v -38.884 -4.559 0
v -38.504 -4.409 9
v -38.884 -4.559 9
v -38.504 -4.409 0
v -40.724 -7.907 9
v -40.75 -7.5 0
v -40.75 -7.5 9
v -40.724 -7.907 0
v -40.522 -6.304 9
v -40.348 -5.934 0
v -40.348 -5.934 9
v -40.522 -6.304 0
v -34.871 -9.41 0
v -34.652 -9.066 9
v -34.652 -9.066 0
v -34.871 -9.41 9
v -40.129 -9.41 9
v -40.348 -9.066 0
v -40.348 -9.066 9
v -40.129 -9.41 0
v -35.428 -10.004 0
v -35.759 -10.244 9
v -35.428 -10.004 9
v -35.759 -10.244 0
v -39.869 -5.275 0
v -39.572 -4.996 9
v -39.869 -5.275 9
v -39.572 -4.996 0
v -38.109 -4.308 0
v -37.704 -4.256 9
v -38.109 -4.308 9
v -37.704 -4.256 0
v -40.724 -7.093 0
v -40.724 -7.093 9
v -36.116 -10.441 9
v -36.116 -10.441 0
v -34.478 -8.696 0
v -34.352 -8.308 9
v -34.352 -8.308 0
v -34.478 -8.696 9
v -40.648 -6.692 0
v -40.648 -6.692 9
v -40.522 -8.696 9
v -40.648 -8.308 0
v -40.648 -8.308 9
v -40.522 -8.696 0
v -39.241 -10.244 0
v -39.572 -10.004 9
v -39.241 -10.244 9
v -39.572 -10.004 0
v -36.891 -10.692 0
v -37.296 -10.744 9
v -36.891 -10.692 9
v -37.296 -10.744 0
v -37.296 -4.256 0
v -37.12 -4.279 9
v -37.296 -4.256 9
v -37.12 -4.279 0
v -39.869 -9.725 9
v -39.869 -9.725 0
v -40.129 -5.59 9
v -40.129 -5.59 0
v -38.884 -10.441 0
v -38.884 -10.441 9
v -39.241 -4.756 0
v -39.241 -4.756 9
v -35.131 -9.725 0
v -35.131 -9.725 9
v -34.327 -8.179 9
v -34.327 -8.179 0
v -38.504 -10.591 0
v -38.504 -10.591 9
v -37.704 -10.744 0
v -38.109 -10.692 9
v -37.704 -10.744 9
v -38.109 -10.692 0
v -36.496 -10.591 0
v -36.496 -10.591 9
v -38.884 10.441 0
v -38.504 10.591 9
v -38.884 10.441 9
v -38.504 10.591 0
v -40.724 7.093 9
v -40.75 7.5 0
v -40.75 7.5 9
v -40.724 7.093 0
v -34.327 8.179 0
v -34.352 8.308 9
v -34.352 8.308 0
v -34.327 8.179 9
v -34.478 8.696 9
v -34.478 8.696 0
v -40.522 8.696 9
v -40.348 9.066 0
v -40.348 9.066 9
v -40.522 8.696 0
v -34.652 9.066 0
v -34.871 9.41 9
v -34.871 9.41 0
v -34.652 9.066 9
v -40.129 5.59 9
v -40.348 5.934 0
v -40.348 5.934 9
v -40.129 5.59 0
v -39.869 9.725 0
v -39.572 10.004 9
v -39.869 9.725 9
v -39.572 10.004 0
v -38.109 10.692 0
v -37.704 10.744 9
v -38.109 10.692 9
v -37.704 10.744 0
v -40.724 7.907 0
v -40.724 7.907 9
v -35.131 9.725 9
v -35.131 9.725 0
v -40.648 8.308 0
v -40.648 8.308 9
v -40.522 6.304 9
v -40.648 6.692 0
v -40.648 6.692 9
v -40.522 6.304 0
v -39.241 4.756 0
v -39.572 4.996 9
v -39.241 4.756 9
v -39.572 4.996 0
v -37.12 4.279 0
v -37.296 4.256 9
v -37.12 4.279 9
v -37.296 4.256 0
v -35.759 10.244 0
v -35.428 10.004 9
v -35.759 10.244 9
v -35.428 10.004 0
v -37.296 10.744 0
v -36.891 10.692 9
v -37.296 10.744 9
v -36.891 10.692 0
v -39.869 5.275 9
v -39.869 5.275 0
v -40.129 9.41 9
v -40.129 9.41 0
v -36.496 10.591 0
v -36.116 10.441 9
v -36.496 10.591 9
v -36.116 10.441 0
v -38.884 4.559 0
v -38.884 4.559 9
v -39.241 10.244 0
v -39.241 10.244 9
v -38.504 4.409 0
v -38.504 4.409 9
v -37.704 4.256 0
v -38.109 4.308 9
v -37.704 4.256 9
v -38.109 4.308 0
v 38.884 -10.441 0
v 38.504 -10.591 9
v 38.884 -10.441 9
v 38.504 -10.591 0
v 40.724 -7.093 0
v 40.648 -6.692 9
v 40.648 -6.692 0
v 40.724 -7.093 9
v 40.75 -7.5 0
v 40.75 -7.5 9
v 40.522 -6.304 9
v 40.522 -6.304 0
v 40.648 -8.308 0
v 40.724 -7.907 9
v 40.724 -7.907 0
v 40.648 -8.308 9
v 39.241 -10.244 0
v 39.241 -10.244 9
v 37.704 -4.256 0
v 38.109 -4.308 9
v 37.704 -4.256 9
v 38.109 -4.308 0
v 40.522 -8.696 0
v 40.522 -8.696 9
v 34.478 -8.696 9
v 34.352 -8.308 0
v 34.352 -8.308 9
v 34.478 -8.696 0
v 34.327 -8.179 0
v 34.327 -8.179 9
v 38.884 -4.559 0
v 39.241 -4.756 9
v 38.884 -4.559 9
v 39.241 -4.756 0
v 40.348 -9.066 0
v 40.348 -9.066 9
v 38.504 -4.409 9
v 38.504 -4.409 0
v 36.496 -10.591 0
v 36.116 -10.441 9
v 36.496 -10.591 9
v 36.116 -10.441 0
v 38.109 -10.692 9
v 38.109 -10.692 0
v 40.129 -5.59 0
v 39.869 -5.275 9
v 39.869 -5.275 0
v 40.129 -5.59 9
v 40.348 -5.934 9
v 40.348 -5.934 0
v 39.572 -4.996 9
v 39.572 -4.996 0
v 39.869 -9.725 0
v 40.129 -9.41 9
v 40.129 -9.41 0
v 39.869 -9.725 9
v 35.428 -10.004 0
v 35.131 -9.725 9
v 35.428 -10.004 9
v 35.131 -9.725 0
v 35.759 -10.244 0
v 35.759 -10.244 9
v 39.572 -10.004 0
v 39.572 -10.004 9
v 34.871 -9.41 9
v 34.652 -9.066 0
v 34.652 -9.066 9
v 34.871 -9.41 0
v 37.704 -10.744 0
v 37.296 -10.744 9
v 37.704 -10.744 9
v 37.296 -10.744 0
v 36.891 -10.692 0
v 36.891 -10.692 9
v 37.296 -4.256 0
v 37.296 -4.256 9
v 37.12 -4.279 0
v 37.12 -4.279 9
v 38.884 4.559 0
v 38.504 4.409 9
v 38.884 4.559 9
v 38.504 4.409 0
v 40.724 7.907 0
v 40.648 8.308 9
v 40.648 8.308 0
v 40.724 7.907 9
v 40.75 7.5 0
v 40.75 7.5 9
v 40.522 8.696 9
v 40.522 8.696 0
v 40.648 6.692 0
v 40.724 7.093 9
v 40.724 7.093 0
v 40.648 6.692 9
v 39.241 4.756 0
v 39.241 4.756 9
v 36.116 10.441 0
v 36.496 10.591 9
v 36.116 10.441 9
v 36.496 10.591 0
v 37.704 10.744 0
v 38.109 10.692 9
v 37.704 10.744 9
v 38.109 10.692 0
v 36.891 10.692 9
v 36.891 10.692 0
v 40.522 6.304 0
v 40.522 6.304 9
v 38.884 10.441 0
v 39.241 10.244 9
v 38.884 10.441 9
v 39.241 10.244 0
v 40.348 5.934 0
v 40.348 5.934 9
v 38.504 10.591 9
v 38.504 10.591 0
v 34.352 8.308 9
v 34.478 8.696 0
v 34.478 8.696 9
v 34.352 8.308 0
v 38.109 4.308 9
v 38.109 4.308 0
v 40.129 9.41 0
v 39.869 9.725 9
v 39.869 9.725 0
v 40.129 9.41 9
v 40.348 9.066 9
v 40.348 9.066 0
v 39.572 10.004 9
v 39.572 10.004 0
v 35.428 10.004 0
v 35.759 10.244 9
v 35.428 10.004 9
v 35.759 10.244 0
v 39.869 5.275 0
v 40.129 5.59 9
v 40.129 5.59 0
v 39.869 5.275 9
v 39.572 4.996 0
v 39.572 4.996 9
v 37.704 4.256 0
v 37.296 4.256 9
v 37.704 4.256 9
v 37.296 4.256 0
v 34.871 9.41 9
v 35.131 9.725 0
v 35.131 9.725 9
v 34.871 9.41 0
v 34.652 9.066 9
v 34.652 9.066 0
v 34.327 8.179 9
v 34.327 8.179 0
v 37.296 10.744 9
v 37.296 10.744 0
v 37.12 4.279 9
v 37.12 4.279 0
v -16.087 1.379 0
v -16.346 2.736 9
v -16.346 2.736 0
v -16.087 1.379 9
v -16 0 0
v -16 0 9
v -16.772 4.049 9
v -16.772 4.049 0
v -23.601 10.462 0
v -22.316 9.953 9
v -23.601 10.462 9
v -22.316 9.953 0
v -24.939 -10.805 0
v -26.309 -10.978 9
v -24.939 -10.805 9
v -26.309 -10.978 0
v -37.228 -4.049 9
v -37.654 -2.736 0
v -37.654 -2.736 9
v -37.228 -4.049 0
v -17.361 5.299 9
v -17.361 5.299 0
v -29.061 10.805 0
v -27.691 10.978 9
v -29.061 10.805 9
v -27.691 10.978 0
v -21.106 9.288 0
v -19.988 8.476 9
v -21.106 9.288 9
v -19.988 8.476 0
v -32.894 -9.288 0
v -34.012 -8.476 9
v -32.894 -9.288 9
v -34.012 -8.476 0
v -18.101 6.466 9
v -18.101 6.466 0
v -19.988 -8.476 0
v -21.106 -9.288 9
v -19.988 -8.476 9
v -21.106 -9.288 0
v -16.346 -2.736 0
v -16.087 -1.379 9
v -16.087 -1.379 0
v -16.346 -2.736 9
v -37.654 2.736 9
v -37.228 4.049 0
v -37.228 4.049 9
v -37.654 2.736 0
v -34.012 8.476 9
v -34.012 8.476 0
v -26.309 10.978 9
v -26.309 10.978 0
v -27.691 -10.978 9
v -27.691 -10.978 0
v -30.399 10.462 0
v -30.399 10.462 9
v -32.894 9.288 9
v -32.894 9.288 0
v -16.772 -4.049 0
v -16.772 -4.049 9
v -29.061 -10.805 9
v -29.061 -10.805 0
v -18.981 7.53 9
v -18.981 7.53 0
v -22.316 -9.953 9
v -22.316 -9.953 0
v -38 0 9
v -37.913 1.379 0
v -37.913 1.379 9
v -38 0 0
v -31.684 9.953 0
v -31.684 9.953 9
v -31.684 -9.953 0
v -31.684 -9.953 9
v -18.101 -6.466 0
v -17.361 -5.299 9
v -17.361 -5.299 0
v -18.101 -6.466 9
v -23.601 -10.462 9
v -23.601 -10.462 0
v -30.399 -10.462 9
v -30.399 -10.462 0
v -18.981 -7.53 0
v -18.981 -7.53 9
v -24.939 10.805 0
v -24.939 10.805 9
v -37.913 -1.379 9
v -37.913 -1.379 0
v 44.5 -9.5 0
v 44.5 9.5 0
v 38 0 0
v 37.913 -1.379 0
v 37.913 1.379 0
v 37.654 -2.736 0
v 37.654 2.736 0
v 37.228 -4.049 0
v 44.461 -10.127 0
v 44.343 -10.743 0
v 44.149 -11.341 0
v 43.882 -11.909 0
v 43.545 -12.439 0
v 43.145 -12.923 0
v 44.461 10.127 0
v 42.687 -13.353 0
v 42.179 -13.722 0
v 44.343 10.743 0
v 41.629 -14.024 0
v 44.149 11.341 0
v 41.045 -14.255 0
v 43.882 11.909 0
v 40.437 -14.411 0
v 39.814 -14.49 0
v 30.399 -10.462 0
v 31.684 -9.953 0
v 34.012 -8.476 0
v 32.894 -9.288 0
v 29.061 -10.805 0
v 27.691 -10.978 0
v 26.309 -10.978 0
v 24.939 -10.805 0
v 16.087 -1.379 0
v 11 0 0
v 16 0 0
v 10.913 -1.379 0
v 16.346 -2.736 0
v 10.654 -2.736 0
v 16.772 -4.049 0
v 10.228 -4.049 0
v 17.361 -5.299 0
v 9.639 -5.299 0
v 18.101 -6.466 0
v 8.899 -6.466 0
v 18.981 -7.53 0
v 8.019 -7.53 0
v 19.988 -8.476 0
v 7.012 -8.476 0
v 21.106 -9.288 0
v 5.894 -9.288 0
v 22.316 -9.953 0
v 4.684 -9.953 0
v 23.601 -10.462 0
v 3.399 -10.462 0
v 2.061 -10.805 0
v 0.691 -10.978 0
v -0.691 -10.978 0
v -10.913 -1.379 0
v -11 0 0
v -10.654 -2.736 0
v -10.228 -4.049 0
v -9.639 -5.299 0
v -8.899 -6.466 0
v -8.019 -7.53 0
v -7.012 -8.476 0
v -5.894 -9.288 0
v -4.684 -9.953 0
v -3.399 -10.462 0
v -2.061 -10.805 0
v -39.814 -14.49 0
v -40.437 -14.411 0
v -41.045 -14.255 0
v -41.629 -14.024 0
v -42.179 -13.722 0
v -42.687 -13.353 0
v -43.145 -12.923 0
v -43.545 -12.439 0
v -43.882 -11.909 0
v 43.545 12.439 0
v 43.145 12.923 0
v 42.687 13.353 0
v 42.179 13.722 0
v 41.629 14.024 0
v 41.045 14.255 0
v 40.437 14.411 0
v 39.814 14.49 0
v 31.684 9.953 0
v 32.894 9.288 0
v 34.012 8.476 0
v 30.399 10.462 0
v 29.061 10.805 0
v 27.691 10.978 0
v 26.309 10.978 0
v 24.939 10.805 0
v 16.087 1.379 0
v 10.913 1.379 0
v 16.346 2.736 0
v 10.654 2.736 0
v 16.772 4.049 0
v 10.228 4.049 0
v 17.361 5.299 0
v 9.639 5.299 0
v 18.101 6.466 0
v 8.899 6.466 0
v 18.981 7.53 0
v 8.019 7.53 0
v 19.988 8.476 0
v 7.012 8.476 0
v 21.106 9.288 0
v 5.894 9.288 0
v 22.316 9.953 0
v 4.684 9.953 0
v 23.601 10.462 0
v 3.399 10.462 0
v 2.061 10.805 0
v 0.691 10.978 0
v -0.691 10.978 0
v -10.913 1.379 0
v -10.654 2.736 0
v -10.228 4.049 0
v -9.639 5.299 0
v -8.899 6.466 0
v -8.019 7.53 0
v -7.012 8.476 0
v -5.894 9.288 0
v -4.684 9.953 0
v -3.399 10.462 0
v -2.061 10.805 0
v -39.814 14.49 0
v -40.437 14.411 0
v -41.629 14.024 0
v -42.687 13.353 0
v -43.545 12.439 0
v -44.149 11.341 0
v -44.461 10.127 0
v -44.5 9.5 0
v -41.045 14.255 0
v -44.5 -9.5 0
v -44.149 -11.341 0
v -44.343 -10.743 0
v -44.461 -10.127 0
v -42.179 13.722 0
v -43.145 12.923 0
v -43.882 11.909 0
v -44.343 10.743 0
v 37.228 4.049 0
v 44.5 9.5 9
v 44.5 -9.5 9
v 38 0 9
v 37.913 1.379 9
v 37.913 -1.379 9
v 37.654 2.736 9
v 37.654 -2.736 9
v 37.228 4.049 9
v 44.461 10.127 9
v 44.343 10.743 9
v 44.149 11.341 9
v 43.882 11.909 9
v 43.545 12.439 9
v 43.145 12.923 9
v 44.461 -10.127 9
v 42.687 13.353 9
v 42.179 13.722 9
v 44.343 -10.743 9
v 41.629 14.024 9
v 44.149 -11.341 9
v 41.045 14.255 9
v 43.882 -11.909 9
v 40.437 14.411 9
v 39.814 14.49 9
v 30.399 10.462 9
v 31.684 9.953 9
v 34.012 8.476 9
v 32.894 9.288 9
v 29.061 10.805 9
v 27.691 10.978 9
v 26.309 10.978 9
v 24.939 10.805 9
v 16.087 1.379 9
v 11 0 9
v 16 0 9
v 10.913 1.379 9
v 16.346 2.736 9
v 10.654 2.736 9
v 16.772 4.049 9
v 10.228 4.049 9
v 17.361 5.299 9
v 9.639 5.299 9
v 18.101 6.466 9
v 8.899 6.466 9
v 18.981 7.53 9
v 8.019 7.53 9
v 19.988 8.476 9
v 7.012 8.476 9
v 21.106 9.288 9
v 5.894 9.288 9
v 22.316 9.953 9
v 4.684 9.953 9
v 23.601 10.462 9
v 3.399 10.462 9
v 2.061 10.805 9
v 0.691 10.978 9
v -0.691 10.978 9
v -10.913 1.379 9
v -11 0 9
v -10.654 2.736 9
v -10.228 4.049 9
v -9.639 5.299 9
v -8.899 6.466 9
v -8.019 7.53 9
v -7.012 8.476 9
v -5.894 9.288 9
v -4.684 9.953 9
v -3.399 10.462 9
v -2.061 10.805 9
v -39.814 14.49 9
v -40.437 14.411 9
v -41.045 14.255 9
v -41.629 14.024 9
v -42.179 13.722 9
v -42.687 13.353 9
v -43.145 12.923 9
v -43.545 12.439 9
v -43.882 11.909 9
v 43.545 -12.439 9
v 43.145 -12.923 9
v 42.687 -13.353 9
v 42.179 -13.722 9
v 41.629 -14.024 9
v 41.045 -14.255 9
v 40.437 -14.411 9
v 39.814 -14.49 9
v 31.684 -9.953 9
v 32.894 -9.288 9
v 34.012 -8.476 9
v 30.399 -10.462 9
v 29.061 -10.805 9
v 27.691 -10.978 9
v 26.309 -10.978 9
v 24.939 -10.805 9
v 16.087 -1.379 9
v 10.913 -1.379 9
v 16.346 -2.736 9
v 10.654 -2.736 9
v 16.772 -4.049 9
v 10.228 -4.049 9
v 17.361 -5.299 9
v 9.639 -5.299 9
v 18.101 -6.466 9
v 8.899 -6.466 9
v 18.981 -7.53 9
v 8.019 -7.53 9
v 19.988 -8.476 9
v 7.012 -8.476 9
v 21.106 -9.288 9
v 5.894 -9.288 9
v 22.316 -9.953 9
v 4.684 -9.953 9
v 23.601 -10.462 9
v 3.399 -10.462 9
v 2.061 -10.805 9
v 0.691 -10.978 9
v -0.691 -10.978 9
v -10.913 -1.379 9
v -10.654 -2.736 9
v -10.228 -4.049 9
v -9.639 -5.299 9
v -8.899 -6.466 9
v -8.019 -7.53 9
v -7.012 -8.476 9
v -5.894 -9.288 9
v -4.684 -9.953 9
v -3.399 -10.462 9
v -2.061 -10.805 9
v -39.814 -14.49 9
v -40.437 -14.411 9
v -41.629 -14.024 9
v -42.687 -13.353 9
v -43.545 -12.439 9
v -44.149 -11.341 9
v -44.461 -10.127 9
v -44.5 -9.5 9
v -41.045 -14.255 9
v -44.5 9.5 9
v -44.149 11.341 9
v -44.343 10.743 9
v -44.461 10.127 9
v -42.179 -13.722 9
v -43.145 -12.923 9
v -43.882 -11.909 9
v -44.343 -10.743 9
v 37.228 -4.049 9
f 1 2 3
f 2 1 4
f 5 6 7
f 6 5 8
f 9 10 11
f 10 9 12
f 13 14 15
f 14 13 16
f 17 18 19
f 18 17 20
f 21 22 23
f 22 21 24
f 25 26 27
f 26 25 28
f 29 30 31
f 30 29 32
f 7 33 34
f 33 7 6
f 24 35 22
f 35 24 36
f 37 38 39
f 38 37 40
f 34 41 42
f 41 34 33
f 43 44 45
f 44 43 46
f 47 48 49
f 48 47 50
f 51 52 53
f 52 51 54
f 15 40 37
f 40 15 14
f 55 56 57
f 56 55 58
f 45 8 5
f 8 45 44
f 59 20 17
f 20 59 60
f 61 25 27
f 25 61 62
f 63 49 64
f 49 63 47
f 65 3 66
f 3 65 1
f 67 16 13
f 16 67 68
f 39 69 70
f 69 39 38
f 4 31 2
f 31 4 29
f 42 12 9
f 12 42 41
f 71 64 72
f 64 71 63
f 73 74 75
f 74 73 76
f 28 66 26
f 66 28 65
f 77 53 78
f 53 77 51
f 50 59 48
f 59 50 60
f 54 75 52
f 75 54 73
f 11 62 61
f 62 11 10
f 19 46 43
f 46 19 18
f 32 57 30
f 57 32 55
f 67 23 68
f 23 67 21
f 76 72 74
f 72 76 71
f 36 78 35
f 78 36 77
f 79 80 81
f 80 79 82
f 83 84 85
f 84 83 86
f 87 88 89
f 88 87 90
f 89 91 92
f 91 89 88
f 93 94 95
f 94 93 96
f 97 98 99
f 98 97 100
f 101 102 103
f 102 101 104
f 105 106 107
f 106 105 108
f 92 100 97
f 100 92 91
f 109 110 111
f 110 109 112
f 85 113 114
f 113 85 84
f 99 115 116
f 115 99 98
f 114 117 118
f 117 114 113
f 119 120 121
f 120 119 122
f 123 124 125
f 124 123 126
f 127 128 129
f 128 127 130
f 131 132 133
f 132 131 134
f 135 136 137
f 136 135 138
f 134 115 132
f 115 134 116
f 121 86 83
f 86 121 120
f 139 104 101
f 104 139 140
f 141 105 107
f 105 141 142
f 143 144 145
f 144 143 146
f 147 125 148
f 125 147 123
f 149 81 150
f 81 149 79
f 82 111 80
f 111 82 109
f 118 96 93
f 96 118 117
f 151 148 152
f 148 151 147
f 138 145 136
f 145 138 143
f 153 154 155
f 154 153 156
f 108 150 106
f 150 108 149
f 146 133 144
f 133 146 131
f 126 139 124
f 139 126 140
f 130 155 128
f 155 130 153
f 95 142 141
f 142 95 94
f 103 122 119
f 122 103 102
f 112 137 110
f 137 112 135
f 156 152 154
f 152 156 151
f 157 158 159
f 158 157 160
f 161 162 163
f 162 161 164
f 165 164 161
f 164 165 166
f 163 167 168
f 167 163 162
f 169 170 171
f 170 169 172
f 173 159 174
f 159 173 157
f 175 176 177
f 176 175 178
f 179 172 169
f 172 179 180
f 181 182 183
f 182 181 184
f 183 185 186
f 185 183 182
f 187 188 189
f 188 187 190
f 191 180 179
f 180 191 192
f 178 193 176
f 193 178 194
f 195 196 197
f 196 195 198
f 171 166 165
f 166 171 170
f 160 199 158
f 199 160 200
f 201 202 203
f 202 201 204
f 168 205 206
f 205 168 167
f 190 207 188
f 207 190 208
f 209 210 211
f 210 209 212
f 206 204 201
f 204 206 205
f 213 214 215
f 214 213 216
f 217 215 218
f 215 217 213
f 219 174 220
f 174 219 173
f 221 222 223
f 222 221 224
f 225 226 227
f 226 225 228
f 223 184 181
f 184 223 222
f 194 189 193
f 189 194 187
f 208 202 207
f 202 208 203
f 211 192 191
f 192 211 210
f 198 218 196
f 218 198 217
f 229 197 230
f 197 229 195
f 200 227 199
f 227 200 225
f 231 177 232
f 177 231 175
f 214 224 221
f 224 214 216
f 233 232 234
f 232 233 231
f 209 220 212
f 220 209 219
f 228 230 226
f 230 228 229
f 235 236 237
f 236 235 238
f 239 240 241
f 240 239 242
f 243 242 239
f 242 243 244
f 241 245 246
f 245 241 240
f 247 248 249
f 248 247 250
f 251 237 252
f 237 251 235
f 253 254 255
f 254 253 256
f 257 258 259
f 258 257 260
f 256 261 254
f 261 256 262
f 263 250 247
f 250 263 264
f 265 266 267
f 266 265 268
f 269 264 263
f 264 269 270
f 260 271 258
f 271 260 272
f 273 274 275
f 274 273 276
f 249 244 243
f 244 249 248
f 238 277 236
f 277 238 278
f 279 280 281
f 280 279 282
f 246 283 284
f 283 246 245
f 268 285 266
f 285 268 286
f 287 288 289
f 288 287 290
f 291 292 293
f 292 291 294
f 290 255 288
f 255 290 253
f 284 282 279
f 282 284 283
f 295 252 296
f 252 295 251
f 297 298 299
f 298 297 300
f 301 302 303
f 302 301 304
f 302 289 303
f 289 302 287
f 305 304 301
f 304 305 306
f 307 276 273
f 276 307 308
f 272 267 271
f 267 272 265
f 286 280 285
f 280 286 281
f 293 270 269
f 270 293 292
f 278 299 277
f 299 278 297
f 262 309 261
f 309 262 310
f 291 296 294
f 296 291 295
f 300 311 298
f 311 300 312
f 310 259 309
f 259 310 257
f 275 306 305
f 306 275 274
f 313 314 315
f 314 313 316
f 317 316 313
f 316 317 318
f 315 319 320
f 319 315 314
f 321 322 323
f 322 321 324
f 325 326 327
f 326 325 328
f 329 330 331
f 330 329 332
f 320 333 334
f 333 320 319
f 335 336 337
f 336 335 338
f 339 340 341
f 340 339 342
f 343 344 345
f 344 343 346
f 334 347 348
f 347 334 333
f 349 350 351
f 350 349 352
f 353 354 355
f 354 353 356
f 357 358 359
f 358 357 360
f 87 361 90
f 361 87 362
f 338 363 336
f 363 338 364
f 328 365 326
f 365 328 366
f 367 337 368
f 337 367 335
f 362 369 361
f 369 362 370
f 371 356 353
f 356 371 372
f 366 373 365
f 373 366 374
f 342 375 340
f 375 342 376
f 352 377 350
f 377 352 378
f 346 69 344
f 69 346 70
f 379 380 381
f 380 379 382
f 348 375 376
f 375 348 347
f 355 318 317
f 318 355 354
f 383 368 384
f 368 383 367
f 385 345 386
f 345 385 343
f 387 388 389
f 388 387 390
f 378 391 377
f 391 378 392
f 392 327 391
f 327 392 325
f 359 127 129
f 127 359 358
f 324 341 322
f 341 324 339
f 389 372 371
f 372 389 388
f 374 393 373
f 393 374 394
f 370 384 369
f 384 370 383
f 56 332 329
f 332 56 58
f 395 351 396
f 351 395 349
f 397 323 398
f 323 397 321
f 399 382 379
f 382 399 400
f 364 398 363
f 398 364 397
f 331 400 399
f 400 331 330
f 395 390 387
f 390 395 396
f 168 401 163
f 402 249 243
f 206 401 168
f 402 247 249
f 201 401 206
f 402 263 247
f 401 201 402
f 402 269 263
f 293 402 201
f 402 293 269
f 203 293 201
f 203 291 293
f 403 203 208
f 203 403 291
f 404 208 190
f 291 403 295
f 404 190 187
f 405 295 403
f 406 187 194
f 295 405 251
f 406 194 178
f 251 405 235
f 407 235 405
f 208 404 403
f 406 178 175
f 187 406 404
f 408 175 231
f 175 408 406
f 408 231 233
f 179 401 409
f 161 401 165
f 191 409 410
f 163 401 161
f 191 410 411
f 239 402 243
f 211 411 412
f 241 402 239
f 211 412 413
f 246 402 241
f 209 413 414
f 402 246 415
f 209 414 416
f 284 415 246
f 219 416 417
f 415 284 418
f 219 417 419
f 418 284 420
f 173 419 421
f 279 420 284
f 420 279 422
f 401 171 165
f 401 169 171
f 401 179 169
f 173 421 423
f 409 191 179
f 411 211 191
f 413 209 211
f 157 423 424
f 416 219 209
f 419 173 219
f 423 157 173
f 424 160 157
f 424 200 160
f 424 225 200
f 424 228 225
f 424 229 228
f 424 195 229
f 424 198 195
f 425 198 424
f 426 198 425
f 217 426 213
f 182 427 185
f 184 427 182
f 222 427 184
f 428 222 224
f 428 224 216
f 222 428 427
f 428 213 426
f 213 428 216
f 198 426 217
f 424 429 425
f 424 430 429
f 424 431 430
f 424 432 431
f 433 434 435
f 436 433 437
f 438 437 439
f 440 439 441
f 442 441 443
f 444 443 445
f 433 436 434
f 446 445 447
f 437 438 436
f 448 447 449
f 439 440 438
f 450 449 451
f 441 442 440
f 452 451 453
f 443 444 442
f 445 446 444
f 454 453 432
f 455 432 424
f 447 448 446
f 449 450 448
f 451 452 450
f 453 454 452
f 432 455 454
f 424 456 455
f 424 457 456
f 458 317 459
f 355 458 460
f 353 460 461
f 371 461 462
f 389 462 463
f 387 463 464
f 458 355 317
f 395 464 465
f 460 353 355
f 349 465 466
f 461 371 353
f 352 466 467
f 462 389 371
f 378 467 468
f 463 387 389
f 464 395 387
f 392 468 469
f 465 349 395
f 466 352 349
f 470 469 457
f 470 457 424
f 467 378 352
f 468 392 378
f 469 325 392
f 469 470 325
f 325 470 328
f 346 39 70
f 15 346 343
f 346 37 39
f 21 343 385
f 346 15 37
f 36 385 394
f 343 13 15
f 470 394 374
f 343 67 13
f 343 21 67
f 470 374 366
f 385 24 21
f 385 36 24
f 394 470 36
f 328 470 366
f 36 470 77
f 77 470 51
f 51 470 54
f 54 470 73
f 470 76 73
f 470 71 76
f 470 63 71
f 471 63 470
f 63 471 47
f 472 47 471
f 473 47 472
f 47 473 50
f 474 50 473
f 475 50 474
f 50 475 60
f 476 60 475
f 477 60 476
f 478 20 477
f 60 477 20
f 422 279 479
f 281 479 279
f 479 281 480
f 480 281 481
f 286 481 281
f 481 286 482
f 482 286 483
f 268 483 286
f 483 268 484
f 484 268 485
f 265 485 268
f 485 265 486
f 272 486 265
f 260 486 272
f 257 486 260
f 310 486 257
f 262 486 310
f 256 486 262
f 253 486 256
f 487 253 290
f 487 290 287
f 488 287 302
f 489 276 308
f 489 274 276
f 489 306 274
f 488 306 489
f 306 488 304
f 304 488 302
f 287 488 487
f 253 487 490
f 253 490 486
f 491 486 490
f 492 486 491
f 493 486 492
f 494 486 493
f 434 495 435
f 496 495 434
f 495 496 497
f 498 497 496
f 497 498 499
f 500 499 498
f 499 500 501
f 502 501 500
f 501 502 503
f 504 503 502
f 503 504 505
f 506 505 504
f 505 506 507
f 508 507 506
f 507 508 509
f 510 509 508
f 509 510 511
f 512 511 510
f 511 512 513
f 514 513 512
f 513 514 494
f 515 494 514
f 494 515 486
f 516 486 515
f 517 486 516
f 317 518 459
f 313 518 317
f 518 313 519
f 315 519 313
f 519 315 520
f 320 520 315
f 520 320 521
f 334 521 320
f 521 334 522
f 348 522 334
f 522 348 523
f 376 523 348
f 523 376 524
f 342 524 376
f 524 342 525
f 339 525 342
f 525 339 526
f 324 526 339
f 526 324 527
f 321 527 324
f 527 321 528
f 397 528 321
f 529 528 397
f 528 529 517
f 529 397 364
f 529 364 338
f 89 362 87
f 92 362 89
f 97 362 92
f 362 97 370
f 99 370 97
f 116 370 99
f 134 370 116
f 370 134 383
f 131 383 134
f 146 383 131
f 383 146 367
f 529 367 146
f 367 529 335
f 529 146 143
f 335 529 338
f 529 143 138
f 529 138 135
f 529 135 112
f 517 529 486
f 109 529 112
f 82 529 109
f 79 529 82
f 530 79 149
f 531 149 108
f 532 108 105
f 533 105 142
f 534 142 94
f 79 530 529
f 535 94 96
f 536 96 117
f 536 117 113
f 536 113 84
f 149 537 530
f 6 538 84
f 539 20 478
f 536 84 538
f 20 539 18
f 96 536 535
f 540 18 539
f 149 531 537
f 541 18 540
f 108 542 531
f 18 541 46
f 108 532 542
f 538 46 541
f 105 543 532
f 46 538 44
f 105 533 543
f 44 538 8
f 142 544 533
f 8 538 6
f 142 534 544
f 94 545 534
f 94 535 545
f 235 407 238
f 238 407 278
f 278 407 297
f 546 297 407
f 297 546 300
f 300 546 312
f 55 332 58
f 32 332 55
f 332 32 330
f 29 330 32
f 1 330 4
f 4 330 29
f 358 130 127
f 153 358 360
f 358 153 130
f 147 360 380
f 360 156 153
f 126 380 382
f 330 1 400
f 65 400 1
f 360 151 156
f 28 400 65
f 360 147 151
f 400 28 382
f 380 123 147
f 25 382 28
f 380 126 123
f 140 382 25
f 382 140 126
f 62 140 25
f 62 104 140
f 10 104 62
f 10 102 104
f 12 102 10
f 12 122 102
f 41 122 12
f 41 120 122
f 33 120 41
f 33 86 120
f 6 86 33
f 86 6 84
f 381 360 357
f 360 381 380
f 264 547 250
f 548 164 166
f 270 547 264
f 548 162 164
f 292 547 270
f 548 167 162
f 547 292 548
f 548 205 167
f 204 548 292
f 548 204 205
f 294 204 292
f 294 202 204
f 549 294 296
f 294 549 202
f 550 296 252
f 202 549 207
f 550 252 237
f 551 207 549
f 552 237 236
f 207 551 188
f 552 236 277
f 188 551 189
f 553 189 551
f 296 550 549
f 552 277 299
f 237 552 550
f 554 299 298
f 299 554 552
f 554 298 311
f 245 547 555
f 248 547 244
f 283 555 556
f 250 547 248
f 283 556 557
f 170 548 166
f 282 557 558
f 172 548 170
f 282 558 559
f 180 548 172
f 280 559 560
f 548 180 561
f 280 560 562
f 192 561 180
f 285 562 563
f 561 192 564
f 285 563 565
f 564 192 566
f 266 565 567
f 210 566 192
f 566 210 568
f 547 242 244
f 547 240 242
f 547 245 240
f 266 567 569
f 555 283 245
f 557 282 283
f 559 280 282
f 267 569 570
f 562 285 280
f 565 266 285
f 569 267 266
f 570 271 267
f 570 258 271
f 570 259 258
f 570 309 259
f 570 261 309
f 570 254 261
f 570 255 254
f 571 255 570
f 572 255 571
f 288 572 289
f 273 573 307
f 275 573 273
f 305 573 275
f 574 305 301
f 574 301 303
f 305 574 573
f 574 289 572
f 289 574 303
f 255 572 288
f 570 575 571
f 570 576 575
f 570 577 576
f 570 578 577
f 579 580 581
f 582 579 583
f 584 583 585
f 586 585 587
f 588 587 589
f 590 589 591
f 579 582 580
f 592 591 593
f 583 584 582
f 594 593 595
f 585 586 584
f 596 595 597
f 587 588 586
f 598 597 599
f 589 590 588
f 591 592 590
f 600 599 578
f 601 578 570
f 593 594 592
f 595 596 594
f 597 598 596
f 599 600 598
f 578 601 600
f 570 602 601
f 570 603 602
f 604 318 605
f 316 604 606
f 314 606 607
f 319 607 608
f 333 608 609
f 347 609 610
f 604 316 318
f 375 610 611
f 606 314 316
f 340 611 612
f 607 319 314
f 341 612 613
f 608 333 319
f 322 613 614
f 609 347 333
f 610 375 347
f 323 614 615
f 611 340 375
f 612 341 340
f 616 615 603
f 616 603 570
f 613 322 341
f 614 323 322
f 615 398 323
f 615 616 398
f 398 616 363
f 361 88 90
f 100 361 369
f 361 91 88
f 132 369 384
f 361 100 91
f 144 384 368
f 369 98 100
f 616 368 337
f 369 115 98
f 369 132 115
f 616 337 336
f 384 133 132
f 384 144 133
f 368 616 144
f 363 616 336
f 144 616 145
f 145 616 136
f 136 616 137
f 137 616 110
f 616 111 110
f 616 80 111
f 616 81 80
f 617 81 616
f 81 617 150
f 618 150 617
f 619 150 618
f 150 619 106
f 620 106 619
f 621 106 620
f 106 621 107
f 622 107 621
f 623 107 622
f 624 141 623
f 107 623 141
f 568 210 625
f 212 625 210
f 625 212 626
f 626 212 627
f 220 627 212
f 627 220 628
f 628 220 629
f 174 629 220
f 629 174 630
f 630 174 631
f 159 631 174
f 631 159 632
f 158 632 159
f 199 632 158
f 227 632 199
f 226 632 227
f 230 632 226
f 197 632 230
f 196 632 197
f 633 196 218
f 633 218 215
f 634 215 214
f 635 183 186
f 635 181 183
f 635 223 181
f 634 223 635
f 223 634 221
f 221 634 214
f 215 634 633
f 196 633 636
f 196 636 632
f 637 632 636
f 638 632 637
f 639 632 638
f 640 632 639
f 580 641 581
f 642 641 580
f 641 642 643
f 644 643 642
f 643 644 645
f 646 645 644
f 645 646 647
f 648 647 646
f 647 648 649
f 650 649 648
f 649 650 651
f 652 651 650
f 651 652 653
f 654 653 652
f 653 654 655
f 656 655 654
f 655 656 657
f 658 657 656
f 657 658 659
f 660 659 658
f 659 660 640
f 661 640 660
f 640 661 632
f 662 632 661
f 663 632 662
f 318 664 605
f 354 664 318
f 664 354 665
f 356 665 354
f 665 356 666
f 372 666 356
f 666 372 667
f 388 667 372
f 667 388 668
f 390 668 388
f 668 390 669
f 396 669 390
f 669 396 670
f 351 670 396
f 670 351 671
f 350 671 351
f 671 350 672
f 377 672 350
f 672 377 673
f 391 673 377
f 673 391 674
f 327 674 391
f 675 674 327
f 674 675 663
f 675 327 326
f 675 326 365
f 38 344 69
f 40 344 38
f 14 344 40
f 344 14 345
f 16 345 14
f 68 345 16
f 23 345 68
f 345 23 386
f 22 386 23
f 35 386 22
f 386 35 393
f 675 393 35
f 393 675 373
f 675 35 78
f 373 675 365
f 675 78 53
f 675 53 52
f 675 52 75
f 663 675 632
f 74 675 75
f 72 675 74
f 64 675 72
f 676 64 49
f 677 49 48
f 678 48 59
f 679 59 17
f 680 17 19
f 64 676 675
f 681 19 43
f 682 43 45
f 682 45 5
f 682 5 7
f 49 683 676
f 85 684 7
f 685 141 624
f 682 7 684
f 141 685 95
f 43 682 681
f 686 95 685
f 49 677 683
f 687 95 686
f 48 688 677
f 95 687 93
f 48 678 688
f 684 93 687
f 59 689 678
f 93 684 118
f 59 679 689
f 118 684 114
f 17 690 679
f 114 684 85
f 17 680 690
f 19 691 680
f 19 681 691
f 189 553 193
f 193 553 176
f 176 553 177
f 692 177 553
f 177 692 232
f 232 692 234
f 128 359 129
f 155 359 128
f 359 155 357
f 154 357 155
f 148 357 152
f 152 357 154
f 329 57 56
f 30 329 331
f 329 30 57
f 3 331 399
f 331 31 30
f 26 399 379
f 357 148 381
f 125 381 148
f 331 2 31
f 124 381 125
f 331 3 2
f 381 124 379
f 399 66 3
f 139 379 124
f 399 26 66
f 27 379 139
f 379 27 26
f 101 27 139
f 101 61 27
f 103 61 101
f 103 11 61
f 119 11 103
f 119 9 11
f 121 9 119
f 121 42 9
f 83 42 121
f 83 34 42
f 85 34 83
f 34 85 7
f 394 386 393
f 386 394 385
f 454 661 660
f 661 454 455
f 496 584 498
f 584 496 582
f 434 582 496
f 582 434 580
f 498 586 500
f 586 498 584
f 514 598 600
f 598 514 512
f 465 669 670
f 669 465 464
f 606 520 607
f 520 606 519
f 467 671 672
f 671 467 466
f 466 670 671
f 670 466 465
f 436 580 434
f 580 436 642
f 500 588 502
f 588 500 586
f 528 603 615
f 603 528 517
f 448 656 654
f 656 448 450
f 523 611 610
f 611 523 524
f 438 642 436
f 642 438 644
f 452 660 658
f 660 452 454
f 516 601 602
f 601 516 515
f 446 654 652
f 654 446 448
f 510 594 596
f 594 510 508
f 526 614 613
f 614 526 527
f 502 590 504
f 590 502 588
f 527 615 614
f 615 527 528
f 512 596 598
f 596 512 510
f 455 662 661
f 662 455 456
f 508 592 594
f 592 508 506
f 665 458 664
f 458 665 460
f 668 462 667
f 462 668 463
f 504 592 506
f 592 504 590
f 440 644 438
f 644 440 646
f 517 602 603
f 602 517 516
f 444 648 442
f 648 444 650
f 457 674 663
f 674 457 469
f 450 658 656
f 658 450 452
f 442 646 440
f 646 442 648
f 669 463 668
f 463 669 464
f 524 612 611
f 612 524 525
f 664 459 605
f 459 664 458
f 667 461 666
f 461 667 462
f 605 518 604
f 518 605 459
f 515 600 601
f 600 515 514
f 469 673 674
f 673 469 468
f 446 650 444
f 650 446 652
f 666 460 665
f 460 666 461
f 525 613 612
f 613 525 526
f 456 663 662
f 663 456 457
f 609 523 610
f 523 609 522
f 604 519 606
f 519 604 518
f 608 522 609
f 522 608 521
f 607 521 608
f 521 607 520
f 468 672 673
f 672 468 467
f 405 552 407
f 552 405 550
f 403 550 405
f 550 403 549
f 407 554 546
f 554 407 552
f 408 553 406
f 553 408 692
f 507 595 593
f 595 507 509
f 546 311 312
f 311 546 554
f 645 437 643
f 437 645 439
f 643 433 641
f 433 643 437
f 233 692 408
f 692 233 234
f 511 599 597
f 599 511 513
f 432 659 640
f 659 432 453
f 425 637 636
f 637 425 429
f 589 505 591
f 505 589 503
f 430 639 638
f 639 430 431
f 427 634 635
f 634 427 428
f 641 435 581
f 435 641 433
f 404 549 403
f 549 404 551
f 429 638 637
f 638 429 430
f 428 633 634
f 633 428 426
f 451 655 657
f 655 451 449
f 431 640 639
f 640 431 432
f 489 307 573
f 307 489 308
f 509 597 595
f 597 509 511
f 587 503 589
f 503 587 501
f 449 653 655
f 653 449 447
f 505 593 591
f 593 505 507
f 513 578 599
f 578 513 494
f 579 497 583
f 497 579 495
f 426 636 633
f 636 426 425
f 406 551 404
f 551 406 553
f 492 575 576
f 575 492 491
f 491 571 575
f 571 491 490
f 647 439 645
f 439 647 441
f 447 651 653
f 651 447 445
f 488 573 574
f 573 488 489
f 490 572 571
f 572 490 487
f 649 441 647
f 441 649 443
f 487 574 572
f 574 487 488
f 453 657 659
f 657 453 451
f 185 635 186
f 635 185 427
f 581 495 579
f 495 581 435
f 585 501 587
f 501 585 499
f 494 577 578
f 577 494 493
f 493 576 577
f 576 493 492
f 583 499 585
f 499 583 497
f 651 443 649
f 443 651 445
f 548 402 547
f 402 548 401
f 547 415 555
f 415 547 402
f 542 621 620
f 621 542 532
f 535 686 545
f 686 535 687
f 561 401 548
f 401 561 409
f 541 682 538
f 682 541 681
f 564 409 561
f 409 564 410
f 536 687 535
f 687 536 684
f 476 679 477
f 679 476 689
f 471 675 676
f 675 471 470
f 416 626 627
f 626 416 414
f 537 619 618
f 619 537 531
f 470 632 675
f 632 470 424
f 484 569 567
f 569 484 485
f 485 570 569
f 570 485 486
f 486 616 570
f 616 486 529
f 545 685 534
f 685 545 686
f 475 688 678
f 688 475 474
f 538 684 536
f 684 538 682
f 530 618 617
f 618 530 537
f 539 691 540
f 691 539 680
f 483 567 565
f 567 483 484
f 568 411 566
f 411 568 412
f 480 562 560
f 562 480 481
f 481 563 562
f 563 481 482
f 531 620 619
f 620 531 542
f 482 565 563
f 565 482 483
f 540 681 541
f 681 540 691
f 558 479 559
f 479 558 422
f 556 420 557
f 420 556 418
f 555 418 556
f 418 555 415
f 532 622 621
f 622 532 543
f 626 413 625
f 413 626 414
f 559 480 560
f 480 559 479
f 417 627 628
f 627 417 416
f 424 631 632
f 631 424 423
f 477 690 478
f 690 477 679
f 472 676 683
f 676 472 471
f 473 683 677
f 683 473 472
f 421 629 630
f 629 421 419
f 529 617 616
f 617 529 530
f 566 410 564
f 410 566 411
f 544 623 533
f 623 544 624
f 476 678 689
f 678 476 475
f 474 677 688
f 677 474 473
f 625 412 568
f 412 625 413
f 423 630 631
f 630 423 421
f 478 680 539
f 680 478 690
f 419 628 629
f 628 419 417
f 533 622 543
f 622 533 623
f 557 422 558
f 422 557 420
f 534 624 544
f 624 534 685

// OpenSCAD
$fn = 50;

difference() {
	union() {
		hull() {
			translate(v = [-39.5, 9.5, 0]) {
				cylinder(h = 9, r = 5);
			}
			translate(v = [39.5, 9.5, 0]) {
				cylinder(h = 9, r = 5);
			}
			translate(v = [-39.5, -9.5, 0]) {
				cylinder(h = 9, r = 5);
			}
			translate(v = [39.5, -9.5, 0]) {
				cylinder(h = 9, r = 5);
			}
		}
	}
	union() {
		translate(v = [-37.5, -7.5, -100.0]) {
			cylinder(h = 200, r = 3.25);
		}
		translate(v = [-37.5, 7.5, -100.0]) {
			cylinder(h = 200, r = 3.25);
		}
		translate(v = [37.5, -7.5, -100.0]) {
			cylinder(h = 200, r = 3.25);
		}
		translate(v = [37.5, 7.5, -100.0]) {
			cylinder(h = 200, r = 3.25);
		}
		translate(v = [-37.5, -7.5, -100.0]) {
			cylinder(h = 200, r = 1.8);
		}
		translate(v = [-37.5, 7.5, -100.0]) {
			cylinder(h = 200, r = 1.8);
		}
		translate(v = [37.5, -7.5, -100.0]) {
			cylinder(h = 200, r = 1.8);
		}
		translate(v = [37.5, 7.5, -100.0]) {
			cylinder(h = 200, r = 1.8);
		}
		translate(v = [-27.0, 0, 0.0]) {
			cylinder(h = 9, r = 11.0);
		}
		cylinder(h = 9, r = 11.0);
		translate(v = [27.0, 0, 0.0]) {
			cylinder(h = 9, r = 11.0);
		}
	}
}
